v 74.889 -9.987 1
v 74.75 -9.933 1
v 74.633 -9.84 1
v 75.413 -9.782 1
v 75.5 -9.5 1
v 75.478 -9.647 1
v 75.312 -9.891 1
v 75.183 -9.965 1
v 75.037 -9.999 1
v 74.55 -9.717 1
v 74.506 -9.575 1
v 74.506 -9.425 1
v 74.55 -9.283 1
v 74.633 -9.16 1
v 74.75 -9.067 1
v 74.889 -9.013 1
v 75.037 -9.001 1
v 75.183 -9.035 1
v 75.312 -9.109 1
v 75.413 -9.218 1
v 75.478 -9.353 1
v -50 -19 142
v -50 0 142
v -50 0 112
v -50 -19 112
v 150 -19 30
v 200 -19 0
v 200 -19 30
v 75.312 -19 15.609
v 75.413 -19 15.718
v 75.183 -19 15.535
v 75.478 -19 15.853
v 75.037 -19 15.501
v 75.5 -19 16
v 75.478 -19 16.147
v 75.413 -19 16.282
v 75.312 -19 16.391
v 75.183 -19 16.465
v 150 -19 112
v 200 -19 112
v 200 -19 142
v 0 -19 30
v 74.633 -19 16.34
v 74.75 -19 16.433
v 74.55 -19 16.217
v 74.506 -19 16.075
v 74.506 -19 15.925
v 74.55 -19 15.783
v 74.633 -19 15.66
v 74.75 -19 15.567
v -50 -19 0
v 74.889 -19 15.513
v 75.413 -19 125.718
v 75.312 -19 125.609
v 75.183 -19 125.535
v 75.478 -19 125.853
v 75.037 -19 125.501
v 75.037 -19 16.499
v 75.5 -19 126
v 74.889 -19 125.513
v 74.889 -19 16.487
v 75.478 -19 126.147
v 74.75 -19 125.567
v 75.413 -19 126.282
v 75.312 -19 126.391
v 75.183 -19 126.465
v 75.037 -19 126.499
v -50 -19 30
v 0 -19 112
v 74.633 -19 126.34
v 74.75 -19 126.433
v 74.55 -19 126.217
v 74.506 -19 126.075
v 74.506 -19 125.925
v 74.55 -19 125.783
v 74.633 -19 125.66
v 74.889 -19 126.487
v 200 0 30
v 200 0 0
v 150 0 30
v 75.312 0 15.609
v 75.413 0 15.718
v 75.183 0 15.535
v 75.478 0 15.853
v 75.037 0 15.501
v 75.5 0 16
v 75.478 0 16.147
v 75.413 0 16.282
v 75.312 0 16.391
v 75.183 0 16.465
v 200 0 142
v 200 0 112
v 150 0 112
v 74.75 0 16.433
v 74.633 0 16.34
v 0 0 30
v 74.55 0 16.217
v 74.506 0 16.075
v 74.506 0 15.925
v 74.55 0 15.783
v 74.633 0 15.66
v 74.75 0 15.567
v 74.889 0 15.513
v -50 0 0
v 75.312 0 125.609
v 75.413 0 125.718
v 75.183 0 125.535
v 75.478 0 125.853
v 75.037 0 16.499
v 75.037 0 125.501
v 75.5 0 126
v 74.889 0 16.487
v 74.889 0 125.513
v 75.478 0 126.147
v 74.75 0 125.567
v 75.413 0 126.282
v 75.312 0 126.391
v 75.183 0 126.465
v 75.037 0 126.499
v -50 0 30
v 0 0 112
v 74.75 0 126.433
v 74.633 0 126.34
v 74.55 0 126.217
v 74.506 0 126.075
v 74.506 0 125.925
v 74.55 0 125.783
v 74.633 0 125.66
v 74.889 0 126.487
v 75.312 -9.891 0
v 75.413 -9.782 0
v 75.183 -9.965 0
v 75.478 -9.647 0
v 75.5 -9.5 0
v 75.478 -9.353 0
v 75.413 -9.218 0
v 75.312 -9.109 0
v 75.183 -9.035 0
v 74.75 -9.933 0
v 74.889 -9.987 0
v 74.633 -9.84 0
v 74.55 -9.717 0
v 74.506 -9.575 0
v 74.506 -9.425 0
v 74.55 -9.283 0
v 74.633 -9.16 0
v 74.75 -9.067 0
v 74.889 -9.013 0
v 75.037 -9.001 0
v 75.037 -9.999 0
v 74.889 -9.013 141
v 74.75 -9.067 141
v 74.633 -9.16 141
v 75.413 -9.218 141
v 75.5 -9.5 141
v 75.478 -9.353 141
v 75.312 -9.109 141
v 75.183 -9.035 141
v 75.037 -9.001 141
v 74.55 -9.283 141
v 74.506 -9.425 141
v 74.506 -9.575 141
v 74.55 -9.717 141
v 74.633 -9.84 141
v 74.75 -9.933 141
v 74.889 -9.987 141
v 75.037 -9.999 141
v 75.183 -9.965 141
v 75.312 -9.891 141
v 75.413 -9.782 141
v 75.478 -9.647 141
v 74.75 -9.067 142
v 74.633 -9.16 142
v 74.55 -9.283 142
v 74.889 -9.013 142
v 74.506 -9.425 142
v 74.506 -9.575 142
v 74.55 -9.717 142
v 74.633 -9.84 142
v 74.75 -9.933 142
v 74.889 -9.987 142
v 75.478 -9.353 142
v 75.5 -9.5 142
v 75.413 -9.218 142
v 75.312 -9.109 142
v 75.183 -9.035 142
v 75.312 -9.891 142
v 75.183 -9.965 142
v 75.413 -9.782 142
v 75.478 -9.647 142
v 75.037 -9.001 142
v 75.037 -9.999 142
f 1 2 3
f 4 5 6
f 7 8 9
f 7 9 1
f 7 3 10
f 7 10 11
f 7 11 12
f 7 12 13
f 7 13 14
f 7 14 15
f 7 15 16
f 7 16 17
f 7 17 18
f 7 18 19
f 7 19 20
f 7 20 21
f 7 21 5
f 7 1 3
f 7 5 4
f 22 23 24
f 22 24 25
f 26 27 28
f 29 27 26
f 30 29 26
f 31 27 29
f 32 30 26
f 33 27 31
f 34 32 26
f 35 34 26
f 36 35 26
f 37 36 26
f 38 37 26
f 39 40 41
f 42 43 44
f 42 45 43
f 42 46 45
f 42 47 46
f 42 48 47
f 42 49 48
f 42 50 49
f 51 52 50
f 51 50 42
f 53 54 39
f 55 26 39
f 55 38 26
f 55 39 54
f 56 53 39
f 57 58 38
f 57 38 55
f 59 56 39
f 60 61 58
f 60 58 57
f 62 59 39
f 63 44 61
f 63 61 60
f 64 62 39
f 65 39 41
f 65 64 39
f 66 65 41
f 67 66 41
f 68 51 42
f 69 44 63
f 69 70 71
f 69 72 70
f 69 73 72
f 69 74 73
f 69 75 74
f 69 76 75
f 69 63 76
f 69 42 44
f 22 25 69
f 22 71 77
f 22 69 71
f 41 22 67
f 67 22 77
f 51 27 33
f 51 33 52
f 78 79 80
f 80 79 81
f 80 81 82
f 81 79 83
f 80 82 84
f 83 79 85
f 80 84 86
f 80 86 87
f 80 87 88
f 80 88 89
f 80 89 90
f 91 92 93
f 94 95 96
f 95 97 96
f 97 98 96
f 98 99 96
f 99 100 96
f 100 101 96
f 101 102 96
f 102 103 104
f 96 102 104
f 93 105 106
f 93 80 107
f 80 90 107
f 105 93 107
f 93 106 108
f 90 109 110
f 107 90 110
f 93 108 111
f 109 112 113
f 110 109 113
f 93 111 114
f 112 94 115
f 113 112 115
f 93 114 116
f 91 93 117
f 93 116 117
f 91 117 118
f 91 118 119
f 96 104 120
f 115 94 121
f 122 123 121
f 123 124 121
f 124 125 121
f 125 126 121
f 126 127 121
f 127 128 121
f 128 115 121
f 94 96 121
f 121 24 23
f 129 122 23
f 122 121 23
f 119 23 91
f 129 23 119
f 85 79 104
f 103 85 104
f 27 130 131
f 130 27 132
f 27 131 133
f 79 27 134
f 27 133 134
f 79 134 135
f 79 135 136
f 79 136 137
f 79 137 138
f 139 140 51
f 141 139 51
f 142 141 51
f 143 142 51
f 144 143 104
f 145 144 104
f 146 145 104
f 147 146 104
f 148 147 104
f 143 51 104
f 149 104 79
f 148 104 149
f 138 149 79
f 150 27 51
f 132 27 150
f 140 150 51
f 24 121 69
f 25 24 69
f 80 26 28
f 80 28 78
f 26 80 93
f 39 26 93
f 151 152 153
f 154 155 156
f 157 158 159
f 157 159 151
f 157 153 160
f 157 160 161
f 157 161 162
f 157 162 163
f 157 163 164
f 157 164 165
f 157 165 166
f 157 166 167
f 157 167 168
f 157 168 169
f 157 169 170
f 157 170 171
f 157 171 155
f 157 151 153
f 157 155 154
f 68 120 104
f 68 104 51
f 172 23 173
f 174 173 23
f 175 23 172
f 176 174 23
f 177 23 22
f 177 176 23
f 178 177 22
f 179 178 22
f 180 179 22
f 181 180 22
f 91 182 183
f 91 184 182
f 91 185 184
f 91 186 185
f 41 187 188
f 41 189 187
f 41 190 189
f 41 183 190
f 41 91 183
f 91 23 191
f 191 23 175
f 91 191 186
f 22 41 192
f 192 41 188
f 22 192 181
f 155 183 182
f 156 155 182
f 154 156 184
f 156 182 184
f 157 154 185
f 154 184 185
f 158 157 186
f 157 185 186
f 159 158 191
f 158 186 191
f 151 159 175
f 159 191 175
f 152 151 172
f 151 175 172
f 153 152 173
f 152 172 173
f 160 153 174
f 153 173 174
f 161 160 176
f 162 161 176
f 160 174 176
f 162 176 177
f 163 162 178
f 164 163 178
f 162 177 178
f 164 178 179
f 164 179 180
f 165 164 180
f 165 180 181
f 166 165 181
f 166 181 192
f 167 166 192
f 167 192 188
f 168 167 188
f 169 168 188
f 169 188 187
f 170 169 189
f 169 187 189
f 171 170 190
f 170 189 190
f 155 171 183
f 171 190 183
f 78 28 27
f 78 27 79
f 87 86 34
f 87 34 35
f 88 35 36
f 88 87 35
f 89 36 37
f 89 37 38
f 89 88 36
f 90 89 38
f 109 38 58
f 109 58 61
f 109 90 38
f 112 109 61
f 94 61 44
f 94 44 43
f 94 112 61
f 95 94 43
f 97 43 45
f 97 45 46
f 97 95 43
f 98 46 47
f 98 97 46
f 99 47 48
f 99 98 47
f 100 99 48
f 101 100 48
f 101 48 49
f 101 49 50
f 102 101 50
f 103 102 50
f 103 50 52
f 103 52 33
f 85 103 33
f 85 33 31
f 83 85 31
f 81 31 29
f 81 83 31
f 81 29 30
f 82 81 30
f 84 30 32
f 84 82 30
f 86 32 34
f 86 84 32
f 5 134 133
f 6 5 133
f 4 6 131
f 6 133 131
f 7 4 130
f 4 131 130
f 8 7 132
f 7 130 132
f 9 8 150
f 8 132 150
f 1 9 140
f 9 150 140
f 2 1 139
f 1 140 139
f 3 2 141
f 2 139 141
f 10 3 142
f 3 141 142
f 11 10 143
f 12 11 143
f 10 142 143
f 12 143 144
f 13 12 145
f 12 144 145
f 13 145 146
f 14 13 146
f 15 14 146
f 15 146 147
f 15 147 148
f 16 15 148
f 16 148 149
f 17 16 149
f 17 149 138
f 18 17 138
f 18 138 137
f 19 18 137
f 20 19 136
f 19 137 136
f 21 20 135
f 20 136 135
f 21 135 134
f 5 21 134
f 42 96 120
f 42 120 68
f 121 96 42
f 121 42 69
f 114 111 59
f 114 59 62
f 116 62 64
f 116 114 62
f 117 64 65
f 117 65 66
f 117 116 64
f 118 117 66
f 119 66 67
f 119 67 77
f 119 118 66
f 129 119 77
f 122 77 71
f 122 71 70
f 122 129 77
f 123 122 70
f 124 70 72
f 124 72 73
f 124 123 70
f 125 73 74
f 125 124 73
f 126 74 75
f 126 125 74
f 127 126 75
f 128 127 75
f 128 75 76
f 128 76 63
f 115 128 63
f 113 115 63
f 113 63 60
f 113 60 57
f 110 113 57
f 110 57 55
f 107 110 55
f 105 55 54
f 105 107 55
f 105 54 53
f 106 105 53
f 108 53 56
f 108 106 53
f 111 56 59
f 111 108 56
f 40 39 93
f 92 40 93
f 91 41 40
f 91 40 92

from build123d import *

# Parameters (mm, degrees)
F0_W     = 150
F0_H     = 142
F0_R     = 0.5
F1_DEPTH = 19
F2_R     = 0.5
F3_DEPTH = 1
F4_R     = 0.5
F5_DEPTH = 1
F6_W     = 19
F6_H     = 30
F7_DEPTH = 50
F8_W     = 19
F8_H     = 30
F9_DEPTH = 50


with BuildPart() as f1:
    # F0 (on Front) → F1 (new body)
    with BuildSketch(Plane.XZ):
        with Locations((75, 71)):
            Rectangle(F0_W, F0_H)
        with Locations((75, 16)):
            Circle(F0_R, mode=Mode.SUBTRACT)
        with Locations((75, 126)):
            Circle(F0_R, mode=Mode.SUBTRACT)
    extrude(amount=F1_DEPTH)

    # F2 (on face) → F3 (cut)
    with BuildSketch(Plane(origin=(0, 0, 0), x_dir=(1, 0, 0), z_dir=(0, 0, -1))):
        with Locations((75, 9.5)):
            Circle(F2_R)
    extrude(amount=-F3_DEPTH, mode=Mode.SUBTRACT)

    # F4 (on face) → F5 (cut)
    with BuildSketch(Plane.XY.offset(142)):
        with Locations((75, -9.5)):
            Circle(F4_R)
    extrude(amount=-F5_DEPTH, mode=Mode.SUBTRACT)

    # F6 (on face) → F7 (join)
    with BuildSketch(Plane(origin=(0, 0, 0), x_dir=(0, -1, 0), z_dir=(-1, 0, 0))):
        with Locations((9.5, 127)):
            Rectangle(F6_W, F6_H)
        with Locations((9.5, 15)):
            Rectangle(F6_W, F6_H)
    extrude(amount=F7_DEPTH)

    # F8 (on face) → F9 (join)
    with BuildSketch(Plane.YZ.offset(150)):
        with Locations((-9.5, 15)):
            Rectangle(F8_W, F8_H)
        with Locations((-9.5, 127)):
            Rectangle(F8_W, F8_H)
    extrude(amount=F9_DEPTH)


solid = f1.part
